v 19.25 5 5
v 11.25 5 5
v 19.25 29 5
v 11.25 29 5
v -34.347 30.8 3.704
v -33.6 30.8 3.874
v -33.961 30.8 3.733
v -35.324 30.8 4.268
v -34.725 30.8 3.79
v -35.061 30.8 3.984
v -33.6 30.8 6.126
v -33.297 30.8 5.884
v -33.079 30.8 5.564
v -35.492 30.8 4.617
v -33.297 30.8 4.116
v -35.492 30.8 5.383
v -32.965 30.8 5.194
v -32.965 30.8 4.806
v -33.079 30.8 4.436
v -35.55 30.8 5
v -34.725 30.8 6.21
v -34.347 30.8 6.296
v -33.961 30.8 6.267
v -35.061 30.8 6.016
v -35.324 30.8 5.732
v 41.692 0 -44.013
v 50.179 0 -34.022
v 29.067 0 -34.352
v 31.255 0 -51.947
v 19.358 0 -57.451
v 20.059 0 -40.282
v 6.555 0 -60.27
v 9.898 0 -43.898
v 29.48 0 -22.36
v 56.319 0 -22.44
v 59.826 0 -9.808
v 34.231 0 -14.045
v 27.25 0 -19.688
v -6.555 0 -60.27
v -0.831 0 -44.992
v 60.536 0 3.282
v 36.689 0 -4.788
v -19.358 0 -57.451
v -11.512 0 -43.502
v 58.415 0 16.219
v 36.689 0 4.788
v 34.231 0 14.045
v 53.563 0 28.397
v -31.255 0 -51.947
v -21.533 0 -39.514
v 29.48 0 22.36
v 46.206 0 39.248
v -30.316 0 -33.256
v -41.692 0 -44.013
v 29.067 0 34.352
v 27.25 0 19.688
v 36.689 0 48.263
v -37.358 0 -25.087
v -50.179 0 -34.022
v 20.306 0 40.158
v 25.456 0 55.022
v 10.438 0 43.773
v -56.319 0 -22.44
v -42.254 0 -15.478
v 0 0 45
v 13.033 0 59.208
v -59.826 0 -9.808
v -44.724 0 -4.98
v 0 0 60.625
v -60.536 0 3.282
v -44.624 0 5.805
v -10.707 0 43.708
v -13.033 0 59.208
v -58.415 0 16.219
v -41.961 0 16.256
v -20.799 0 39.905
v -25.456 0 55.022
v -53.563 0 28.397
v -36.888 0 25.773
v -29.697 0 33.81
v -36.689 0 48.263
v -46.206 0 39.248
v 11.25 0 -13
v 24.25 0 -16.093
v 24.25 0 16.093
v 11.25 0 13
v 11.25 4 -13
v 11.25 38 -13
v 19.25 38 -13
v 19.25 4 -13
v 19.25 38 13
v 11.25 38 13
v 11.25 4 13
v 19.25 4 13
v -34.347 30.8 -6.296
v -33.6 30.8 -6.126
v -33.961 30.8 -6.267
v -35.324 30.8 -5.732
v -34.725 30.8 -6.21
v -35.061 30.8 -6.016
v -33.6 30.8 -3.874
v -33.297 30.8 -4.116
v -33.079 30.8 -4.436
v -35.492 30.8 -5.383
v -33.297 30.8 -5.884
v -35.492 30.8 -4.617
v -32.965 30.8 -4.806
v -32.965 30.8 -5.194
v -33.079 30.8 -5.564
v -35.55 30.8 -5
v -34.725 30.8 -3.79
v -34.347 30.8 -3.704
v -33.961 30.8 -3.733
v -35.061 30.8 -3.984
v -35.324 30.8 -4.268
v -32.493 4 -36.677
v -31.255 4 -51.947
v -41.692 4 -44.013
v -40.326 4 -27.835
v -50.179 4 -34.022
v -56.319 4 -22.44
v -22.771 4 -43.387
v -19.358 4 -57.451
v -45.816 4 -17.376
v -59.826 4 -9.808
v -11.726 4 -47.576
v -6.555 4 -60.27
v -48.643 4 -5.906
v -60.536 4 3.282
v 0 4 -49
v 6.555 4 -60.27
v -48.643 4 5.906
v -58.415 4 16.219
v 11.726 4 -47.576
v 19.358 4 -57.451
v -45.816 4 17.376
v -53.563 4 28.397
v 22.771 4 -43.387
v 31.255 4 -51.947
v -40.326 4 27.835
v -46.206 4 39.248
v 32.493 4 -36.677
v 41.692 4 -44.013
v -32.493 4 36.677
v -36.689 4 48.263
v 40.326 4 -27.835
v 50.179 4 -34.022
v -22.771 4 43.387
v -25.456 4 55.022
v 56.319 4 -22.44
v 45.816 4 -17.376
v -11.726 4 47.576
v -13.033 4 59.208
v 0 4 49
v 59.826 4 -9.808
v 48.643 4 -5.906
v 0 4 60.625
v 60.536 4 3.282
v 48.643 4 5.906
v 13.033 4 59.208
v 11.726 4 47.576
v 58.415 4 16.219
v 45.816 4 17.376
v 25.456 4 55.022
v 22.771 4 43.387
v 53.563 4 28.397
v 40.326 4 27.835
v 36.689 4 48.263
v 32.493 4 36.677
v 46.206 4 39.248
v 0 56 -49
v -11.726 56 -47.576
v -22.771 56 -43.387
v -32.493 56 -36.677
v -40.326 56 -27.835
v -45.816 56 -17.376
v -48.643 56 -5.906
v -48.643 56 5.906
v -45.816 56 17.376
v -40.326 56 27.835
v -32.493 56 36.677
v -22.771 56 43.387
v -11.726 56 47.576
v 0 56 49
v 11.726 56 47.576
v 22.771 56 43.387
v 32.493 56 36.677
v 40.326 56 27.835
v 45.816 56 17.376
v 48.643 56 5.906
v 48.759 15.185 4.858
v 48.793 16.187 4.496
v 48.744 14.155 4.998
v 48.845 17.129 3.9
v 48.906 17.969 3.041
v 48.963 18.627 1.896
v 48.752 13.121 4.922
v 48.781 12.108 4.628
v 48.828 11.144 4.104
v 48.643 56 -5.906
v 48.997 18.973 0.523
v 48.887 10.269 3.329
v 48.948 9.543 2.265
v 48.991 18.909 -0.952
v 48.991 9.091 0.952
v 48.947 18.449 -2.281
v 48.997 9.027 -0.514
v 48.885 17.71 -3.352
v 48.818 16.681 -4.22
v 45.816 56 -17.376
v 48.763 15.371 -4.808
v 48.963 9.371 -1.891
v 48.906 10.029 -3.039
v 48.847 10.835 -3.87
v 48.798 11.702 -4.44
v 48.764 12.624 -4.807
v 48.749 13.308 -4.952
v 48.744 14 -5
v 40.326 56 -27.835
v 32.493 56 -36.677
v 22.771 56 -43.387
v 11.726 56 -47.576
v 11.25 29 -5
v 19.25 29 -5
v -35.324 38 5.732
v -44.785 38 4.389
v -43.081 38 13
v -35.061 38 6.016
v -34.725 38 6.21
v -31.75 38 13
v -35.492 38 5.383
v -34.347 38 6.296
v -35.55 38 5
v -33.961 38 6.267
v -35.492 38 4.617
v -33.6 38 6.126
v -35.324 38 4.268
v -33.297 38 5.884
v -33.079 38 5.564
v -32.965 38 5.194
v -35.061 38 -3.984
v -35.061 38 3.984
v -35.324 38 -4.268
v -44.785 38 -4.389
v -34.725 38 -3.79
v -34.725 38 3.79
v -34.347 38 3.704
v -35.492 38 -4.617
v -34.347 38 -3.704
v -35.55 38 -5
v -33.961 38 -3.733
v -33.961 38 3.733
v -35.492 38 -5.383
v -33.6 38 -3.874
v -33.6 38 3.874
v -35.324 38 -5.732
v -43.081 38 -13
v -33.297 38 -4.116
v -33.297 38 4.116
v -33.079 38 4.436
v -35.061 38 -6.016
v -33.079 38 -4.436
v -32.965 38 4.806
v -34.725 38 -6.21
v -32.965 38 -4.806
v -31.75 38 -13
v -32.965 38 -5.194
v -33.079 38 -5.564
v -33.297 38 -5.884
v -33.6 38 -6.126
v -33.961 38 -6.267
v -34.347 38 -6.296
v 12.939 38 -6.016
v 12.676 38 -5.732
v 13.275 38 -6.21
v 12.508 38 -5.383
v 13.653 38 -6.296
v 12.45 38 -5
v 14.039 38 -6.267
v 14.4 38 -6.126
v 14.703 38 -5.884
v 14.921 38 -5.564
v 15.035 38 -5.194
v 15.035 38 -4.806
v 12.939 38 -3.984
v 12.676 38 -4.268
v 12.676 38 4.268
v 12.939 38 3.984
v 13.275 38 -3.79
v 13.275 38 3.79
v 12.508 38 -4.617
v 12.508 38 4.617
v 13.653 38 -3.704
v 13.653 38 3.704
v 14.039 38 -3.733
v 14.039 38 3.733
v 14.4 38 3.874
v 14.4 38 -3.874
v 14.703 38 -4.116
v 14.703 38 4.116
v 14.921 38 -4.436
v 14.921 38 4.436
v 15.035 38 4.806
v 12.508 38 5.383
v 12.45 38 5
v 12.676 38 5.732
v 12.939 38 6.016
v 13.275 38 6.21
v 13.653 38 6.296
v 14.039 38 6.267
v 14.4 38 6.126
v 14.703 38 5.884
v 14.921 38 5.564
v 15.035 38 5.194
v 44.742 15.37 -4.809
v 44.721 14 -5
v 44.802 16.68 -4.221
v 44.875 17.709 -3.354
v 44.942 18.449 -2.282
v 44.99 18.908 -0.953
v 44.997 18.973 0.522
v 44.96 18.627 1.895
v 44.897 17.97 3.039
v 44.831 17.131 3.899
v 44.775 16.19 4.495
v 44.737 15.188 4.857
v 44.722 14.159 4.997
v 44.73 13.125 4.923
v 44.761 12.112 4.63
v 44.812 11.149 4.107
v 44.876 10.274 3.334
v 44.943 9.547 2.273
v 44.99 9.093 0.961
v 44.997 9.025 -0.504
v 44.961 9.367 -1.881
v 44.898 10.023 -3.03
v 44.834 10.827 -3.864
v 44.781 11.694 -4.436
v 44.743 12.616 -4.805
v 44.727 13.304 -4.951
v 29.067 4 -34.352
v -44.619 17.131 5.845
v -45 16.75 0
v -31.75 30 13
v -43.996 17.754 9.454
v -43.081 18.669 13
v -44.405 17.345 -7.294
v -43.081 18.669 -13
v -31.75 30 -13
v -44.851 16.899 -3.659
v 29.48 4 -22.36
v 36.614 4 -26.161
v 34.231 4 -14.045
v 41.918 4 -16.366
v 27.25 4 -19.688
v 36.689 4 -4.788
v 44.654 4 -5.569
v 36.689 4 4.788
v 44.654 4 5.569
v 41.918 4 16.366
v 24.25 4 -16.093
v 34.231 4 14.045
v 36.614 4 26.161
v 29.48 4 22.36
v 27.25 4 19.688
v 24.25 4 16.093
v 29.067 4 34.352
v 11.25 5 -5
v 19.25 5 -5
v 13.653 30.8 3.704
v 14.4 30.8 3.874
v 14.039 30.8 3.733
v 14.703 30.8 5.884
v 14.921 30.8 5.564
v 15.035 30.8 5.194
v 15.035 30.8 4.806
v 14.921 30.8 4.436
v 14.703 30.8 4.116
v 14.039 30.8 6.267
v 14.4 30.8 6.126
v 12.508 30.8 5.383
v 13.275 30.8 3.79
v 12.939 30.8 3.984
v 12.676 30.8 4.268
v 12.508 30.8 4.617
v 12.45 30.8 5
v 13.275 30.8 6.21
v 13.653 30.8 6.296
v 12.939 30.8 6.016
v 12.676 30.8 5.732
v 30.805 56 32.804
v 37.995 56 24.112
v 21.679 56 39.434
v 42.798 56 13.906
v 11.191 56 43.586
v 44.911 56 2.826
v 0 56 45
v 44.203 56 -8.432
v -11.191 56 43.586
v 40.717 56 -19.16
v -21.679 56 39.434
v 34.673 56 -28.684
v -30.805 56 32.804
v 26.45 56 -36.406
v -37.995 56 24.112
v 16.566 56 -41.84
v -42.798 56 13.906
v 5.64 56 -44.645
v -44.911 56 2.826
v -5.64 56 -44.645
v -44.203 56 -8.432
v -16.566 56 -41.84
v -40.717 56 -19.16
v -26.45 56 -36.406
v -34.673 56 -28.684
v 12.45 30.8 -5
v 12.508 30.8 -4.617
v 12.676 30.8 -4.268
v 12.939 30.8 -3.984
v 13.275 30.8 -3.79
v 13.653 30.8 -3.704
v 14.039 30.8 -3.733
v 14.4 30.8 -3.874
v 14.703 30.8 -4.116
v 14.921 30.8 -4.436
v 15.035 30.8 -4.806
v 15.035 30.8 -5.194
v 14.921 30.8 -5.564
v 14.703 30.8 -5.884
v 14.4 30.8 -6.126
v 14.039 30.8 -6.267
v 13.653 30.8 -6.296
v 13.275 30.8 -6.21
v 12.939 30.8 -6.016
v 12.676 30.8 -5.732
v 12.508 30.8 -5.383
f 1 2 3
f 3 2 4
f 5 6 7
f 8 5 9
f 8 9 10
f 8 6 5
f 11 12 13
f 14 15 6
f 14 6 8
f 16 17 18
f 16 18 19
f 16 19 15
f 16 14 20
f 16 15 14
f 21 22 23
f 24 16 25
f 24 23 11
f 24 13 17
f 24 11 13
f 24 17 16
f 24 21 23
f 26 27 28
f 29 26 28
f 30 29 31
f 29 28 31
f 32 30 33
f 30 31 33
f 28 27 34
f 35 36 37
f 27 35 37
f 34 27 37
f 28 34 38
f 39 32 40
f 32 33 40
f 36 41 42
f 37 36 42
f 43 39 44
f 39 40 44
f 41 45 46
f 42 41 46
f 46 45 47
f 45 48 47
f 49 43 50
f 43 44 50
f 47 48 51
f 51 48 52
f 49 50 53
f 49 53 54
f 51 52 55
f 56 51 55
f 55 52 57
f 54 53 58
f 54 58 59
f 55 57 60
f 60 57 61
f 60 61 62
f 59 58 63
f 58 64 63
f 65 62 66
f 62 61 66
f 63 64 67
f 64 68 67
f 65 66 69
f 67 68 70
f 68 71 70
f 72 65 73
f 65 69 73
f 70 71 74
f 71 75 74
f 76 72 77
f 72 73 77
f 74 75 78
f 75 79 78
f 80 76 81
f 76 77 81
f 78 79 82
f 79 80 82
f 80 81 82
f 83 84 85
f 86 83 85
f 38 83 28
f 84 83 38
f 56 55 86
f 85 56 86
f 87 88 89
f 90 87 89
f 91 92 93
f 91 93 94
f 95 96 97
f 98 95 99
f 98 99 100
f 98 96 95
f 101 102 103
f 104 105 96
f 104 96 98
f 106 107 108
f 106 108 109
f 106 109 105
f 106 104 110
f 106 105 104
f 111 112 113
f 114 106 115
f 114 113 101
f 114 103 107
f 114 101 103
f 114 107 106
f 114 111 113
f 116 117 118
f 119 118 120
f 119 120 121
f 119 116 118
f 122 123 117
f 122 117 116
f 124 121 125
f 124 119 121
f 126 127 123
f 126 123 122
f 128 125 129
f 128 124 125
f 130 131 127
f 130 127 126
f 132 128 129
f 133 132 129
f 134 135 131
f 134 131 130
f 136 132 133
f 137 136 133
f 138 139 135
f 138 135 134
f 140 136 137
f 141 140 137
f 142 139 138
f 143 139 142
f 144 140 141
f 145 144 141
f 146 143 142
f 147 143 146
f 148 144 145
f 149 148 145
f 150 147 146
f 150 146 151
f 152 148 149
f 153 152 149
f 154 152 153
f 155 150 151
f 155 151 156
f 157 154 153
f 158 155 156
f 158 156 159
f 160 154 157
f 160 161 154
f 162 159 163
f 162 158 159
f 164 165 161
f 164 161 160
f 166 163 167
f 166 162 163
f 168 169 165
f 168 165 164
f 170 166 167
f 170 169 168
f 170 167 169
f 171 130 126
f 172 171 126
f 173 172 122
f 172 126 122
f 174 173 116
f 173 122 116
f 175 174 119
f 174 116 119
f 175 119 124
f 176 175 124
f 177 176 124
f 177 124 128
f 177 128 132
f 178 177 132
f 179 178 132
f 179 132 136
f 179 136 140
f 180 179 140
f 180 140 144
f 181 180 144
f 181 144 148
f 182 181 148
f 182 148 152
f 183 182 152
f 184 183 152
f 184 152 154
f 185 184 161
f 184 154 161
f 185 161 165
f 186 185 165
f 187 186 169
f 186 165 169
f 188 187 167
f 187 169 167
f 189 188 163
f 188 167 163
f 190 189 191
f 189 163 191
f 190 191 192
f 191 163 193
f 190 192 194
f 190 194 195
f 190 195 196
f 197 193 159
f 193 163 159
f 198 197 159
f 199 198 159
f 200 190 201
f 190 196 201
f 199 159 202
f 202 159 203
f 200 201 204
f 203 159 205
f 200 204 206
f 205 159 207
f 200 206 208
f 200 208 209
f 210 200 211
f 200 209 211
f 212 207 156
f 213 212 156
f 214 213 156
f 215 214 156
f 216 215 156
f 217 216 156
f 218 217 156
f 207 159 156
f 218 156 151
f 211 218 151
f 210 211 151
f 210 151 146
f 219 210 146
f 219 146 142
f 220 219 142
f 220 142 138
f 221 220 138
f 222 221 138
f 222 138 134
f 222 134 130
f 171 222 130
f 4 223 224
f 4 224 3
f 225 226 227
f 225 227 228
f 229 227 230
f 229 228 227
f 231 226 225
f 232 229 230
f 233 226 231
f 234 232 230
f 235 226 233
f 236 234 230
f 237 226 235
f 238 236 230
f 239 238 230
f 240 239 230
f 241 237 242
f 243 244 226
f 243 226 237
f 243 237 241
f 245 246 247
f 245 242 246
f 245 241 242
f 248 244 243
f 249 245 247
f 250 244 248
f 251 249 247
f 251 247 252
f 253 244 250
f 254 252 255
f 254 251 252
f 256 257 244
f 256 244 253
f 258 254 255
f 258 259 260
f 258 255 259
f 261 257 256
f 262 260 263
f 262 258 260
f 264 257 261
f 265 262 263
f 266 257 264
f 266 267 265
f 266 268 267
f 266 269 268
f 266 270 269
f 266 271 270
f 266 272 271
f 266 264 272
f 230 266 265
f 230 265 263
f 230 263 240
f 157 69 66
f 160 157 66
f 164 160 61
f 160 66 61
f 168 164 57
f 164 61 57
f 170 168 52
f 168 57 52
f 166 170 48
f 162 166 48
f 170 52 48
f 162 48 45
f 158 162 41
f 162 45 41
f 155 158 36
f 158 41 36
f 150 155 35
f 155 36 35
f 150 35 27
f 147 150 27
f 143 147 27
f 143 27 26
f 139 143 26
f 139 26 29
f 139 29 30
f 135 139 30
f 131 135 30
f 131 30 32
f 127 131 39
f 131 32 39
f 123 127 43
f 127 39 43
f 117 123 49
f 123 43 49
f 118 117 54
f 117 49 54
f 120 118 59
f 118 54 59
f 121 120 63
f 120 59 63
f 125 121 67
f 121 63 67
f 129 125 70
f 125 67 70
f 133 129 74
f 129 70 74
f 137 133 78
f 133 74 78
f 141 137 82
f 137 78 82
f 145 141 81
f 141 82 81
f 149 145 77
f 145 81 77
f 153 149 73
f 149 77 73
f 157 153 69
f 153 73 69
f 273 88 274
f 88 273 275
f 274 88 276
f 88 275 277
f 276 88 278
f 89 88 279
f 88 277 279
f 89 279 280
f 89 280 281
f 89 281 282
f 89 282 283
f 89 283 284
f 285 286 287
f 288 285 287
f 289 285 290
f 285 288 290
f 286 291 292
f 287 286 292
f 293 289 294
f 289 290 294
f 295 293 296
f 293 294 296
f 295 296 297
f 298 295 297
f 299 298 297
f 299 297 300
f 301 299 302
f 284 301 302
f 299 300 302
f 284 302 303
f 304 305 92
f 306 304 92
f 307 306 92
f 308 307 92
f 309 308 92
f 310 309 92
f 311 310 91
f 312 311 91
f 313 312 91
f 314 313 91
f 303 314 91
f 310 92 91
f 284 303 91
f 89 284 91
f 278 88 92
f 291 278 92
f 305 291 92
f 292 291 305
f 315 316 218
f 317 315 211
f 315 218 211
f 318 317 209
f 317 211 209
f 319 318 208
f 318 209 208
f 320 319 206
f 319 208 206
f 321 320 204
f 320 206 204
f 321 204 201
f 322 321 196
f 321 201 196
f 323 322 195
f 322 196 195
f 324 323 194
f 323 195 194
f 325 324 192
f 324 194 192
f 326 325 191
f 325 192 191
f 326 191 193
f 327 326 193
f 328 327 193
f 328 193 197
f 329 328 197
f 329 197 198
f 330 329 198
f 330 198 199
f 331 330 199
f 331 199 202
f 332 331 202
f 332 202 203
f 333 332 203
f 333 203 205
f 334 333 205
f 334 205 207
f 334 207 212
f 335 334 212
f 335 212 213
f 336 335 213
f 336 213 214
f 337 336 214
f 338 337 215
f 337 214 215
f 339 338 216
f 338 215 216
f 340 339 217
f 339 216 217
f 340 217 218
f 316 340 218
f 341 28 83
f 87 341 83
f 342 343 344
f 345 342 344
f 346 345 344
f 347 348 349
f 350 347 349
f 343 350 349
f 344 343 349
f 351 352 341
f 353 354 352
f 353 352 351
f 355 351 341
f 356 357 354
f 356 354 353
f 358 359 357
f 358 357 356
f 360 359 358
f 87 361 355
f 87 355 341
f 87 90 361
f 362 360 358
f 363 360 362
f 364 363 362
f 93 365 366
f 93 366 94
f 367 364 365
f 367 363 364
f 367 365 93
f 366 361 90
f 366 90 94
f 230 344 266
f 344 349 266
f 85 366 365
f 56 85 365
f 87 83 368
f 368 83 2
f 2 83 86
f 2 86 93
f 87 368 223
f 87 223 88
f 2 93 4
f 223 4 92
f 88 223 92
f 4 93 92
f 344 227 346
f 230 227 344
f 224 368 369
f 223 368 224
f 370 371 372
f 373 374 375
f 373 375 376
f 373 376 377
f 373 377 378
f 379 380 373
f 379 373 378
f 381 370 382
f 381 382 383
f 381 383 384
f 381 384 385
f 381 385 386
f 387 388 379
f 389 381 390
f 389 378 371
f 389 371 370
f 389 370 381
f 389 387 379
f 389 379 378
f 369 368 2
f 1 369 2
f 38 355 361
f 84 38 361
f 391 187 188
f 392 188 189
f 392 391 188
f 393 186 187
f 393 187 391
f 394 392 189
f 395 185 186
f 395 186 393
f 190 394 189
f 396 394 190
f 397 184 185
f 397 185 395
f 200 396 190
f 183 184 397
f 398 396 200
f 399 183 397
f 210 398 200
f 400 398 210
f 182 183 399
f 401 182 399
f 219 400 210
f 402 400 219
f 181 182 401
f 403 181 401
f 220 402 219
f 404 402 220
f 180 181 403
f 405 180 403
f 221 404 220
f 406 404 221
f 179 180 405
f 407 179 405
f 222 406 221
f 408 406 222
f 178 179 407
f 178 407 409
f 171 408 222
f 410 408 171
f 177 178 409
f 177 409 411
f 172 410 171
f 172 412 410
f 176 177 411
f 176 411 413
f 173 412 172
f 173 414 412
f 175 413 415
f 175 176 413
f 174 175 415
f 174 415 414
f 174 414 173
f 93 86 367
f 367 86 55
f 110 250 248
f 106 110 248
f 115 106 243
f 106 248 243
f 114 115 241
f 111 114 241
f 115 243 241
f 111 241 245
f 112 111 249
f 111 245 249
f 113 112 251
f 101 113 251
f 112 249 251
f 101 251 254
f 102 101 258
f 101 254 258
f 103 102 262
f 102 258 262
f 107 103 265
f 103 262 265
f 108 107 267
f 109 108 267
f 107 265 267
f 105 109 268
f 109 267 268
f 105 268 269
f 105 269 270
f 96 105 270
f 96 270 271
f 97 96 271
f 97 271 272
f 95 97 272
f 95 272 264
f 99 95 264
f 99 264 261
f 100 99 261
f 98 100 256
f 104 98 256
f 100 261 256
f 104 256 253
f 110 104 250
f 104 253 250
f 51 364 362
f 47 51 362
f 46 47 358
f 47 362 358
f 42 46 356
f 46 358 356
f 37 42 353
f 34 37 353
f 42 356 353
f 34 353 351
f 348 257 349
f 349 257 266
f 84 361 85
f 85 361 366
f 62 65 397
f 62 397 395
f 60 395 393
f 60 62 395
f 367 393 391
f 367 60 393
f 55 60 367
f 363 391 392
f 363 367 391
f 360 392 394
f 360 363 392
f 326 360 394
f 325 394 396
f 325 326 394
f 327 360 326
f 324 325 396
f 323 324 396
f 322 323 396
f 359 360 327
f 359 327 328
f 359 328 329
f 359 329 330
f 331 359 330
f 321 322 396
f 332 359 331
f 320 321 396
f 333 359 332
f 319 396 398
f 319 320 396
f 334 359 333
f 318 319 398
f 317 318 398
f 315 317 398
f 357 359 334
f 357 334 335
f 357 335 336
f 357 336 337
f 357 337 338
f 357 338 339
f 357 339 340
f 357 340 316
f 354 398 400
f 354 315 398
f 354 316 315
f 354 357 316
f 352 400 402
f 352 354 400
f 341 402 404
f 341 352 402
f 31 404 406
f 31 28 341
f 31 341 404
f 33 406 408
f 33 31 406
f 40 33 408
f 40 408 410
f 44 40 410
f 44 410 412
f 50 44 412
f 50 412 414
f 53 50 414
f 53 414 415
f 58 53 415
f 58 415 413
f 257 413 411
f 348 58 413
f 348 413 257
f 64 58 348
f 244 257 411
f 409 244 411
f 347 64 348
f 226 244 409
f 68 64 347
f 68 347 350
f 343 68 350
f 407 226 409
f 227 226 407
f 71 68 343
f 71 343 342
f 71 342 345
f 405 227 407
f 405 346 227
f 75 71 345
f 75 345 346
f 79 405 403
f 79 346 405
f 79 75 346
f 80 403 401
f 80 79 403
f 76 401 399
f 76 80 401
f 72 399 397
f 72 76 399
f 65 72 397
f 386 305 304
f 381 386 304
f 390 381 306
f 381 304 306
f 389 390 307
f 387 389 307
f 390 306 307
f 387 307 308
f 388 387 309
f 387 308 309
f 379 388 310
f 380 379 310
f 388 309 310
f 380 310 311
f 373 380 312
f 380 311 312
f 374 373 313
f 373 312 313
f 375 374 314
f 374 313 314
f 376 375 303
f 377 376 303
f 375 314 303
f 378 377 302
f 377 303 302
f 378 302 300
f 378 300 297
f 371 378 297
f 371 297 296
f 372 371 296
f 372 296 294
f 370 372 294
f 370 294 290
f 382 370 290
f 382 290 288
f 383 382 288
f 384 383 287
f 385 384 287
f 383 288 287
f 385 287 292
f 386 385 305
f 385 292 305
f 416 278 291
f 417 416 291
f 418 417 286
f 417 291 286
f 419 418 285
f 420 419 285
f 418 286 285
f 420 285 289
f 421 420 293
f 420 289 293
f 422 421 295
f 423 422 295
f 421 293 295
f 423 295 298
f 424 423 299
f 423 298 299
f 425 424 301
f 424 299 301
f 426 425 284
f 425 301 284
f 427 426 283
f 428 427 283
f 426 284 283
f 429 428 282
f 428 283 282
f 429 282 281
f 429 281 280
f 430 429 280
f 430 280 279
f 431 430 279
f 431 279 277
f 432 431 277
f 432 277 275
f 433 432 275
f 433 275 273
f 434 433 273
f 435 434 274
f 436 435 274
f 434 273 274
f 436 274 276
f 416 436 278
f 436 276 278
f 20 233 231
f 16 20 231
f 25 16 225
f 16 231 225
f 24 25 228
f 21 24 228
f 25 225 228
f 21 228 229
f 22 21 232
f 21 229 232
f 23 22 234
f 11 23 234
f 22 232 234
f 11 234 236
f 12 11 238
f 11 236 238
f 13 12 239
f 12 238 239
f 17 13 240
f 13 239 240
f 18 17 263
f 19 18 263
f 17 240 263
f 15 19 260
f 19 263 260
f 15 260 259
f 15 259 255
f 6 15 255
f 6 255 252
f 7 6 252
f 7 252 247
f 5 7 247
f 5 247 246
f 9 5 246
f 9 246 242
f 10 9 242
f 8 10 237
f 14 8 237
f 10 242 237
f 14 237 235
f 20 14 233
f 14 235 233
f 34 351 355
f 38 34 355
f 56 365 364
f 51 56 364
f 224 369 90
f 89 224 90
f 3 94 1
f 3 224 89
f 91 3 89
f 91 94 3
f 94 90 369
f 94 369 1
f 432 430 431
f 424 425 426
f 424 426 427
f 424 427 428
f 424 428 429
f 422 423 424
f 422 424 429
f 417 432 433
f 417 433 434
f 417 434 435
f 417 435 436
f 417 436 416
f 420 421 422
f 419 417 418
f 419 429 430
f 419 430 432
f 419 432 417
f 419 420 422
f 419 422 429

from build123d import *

# Parameters (mm, degrees)
SKETCH1_R               = 60.625
SKETCH1_R_2             = 45
BOSS_EXTRUDE1_DEPTH     = 4
SKETCH2_R               = 49
SKETCH2_R_2             = 45
BOSS_EXTRUDE2_DEPTH     = 52
SKETCH4_W               = 13.25
SKETCH4_H               = 8
SKETCH4_W_2             = 8
SKETCH4_H_2             = 38
BOSS_EXTRUDE4_DEPTH     = 13
BOSS_EXTRUDE5_DEPTH     = 4
SKETCH7_R               = 1.3
CUT_EXTRUDE4_DEPTH      = 7.2
SKETCH9_W               = 10
SKETCH9_H               = 24
CUT_EXTRUDE7_DEPTH      = 8
CUT_EXTRUDE8_REACH      = 139.219
CUT_EXTRUDE8_END_RADIUS = 45
SKETCH11_R              = 5
CUT_EXTRUDE9_DEPTH      = 101.273532203


with BuildPart() as part:
    # Sketch1 → Boss-Extrude1 (new body)
    with BuildSketch(Plane(origin=(0, 0, 0), x_dir=(1, 0, 0), z_dir=(0, 1, 0))):
        with Locations(Location((0, 0, 0), (0, 0, 270))):
            Circle(SKETCH1_R)
        with Locations(Location((0, 0, 0), (0, 0, 270))):
            Circle(SKETCH1_R_2, mode=Mode.SUBTRACT)
    extrude(amount=BOSS_EXTRUDE1_DEPTH)

    # Sketch2 → Boss-Extrude2 (add)
    with BuildSketch(Plane(origin=(0, 4, 0), x_dir=(1, 0, 0), z_dir=(0, 1, 0))):
        with Locations(Location((0, 0, 0), (0, 0, 90))):
            Circle(SKETCH2_R)
        with Locations(Location((0, 0, 0), (0, 0, 270))):
            Circle(SKETCH2_R_2, mode=Mode.SUBTRACT)
    extrude(amount=BOSS_EXTRUDE2_DEPTH)

    # Sketch4 → Boss-Extrude4 (add, symmetric)
    with BuildSketch(Plane.XY):
        with Locations((-38.375, 34)):
            Rectangle(SKETCH4_W, SKETCH4_H)
        Polygon((-31.75, 30), (-45, 30), (-45, 16.75), align=None)
        with Locations((15.25, 19)):
            Rectangle(SKETCH4_W_2, SKETCH4_H_2)
    extrude(amount=BOSS_EXTRUDE4_DEPTH, both=True)


with BuildPart() as boss_extrude4_piece_1:
    # of the separate pieces the step leaves, piece 1, a body of its own (boss_extrude4_pieces)
    add(part.part.solids().sort_by_distance((0, 0, 60.625))[0])



with BuildPart() as boss_extrude4_piece_2:
    # of the separate pieces the step leaves, piece 2, a body of its own (boss_extrude4_pieces)
    add(part.part.solids().sort_by_distance((11.25, 38, -13))[0])


with BuildPart() as boss_extrude4_piece_1_1:
    add(boss_extrude4_piece_1.part)

    add(boss_extrude4_piece_2.part)  # Boss-Extrude5 merges Boss-Extrude4 piece 2
    # Sketch5 → Boss-Extrude5 (add)
    with BuildSketch(Plane.XZ):
        with BuildLine():
            Line((11.25, 13), (29.067400866, 34.352382842))
            ThreePointArc((29.067400866, 34.352382842), (45, 0), (29.067400866, -34.352382842))
            Line((29.067400866, -34.352382842), (11.25, -13))
            Line((11.25, -13), (11.25, 13))
        make_face()
    extrude(amount=-BOSS_EXTRUDE5_DEPTH)

    # Sketch7 → Cut-Extrude4 (cut)
    with BuildSketch(Plane(origin=(0, 38, 0), x_dir=(1, 0, 0), z_dir=(0, 1, 0))):
        with Locations(Location((-34.25, 5, 0), (0, 0, 180))):
            Circle(SKETCH7_R)
        with Locations(Location((-34.25, -5, 0), (0, 0, 180))):
            Circle(SKETCH7_R)
        with Locations(Location((13.75, 5, 0), (0, 0, 180))):
            Circle(SKETCH7_R)
        with Locations(Location((13.75, -5, 0), (0, 0, 180))):
            Circle(SKETCH7_R)
    extrude(amount=-CUT_EXTRUDE4_DEPTH, mode=Mode.SUBTRACT)

    # Sketch9 → Cut-Extrude7 (cut)
    with BuildSketch(Plane.ZY.offset(-11.25)):
        with Locations((0, 17)):
            Rectangle(SKETCH9_W, SKETCH9_H)
    extrude(amount=-CUT_EXTRUDE7_DEPTH, mode=Mode.SUBTRACT)

    # Cut-Extrude8: up to this cylinder (the profile starts outside it)
    cut_extrude8_end = Plane(origin=(0, 14, 0), z_dir=(0, -1, 0)) * Cylinder(CUT_EXTRUDE8_END_RADIUS, 369.438, mode=Mode.PRIVATE)
    # Sketch11 → Cut-Extrude8 (cut, up to the surface)
    with BuildSketch(Plane(origin=(49, 0, 0), x_dir=(0, 0, -1), z_dir=(1, 0, 0)), mode=Mode.PRIVATE) as cut_extrude8_sk1:
        with Locations((0, 14)):
            Circle(SKETCH11_R)
    cut_extrude8_tool1 = extrude(cut_extrude8_sk1.sketch, amount=-CUT_EXTRUDE8_REACH, mode=Mode.PRIVATE) - cut_extrude8_end
    add(cut_extrude8_tool1.solids().sort_by_distance((49, 14, 0))[0], mode=Mode.SUBTRACT)

    # Sketch12 → Cut-Extrude9 (cut, through all)
    with BuildSketch(Plane(origin=(0, 4, 0), x_dir=(1, 0, 0), z_dir=(0, 1, 0))):
        with BuildLine():
            Line((29.479537487, 22.359715328), (27.25, 19.687836398))
            Line((27.25, 19.687836398), (27.25, -19.687836398))
            Line((27.25, -19.687836398), (29.479537487, -22.359715328))
            ThreePointArc((29.479537487, -22.359715328), (37, 0), (29.479537487, 22.359715328))
        make_face()
        Polygon((27.25, -19.687836398), (27.25, 19.687836398), (24.25, 16.092634774), (24.25, -16.092634774), align=None)
    extrude(amount=-CUT_EXTRUDE9_DEPTH, mode=Mode.SUBTRACT)


solid = boss_extrude4_piece_1_1.part
